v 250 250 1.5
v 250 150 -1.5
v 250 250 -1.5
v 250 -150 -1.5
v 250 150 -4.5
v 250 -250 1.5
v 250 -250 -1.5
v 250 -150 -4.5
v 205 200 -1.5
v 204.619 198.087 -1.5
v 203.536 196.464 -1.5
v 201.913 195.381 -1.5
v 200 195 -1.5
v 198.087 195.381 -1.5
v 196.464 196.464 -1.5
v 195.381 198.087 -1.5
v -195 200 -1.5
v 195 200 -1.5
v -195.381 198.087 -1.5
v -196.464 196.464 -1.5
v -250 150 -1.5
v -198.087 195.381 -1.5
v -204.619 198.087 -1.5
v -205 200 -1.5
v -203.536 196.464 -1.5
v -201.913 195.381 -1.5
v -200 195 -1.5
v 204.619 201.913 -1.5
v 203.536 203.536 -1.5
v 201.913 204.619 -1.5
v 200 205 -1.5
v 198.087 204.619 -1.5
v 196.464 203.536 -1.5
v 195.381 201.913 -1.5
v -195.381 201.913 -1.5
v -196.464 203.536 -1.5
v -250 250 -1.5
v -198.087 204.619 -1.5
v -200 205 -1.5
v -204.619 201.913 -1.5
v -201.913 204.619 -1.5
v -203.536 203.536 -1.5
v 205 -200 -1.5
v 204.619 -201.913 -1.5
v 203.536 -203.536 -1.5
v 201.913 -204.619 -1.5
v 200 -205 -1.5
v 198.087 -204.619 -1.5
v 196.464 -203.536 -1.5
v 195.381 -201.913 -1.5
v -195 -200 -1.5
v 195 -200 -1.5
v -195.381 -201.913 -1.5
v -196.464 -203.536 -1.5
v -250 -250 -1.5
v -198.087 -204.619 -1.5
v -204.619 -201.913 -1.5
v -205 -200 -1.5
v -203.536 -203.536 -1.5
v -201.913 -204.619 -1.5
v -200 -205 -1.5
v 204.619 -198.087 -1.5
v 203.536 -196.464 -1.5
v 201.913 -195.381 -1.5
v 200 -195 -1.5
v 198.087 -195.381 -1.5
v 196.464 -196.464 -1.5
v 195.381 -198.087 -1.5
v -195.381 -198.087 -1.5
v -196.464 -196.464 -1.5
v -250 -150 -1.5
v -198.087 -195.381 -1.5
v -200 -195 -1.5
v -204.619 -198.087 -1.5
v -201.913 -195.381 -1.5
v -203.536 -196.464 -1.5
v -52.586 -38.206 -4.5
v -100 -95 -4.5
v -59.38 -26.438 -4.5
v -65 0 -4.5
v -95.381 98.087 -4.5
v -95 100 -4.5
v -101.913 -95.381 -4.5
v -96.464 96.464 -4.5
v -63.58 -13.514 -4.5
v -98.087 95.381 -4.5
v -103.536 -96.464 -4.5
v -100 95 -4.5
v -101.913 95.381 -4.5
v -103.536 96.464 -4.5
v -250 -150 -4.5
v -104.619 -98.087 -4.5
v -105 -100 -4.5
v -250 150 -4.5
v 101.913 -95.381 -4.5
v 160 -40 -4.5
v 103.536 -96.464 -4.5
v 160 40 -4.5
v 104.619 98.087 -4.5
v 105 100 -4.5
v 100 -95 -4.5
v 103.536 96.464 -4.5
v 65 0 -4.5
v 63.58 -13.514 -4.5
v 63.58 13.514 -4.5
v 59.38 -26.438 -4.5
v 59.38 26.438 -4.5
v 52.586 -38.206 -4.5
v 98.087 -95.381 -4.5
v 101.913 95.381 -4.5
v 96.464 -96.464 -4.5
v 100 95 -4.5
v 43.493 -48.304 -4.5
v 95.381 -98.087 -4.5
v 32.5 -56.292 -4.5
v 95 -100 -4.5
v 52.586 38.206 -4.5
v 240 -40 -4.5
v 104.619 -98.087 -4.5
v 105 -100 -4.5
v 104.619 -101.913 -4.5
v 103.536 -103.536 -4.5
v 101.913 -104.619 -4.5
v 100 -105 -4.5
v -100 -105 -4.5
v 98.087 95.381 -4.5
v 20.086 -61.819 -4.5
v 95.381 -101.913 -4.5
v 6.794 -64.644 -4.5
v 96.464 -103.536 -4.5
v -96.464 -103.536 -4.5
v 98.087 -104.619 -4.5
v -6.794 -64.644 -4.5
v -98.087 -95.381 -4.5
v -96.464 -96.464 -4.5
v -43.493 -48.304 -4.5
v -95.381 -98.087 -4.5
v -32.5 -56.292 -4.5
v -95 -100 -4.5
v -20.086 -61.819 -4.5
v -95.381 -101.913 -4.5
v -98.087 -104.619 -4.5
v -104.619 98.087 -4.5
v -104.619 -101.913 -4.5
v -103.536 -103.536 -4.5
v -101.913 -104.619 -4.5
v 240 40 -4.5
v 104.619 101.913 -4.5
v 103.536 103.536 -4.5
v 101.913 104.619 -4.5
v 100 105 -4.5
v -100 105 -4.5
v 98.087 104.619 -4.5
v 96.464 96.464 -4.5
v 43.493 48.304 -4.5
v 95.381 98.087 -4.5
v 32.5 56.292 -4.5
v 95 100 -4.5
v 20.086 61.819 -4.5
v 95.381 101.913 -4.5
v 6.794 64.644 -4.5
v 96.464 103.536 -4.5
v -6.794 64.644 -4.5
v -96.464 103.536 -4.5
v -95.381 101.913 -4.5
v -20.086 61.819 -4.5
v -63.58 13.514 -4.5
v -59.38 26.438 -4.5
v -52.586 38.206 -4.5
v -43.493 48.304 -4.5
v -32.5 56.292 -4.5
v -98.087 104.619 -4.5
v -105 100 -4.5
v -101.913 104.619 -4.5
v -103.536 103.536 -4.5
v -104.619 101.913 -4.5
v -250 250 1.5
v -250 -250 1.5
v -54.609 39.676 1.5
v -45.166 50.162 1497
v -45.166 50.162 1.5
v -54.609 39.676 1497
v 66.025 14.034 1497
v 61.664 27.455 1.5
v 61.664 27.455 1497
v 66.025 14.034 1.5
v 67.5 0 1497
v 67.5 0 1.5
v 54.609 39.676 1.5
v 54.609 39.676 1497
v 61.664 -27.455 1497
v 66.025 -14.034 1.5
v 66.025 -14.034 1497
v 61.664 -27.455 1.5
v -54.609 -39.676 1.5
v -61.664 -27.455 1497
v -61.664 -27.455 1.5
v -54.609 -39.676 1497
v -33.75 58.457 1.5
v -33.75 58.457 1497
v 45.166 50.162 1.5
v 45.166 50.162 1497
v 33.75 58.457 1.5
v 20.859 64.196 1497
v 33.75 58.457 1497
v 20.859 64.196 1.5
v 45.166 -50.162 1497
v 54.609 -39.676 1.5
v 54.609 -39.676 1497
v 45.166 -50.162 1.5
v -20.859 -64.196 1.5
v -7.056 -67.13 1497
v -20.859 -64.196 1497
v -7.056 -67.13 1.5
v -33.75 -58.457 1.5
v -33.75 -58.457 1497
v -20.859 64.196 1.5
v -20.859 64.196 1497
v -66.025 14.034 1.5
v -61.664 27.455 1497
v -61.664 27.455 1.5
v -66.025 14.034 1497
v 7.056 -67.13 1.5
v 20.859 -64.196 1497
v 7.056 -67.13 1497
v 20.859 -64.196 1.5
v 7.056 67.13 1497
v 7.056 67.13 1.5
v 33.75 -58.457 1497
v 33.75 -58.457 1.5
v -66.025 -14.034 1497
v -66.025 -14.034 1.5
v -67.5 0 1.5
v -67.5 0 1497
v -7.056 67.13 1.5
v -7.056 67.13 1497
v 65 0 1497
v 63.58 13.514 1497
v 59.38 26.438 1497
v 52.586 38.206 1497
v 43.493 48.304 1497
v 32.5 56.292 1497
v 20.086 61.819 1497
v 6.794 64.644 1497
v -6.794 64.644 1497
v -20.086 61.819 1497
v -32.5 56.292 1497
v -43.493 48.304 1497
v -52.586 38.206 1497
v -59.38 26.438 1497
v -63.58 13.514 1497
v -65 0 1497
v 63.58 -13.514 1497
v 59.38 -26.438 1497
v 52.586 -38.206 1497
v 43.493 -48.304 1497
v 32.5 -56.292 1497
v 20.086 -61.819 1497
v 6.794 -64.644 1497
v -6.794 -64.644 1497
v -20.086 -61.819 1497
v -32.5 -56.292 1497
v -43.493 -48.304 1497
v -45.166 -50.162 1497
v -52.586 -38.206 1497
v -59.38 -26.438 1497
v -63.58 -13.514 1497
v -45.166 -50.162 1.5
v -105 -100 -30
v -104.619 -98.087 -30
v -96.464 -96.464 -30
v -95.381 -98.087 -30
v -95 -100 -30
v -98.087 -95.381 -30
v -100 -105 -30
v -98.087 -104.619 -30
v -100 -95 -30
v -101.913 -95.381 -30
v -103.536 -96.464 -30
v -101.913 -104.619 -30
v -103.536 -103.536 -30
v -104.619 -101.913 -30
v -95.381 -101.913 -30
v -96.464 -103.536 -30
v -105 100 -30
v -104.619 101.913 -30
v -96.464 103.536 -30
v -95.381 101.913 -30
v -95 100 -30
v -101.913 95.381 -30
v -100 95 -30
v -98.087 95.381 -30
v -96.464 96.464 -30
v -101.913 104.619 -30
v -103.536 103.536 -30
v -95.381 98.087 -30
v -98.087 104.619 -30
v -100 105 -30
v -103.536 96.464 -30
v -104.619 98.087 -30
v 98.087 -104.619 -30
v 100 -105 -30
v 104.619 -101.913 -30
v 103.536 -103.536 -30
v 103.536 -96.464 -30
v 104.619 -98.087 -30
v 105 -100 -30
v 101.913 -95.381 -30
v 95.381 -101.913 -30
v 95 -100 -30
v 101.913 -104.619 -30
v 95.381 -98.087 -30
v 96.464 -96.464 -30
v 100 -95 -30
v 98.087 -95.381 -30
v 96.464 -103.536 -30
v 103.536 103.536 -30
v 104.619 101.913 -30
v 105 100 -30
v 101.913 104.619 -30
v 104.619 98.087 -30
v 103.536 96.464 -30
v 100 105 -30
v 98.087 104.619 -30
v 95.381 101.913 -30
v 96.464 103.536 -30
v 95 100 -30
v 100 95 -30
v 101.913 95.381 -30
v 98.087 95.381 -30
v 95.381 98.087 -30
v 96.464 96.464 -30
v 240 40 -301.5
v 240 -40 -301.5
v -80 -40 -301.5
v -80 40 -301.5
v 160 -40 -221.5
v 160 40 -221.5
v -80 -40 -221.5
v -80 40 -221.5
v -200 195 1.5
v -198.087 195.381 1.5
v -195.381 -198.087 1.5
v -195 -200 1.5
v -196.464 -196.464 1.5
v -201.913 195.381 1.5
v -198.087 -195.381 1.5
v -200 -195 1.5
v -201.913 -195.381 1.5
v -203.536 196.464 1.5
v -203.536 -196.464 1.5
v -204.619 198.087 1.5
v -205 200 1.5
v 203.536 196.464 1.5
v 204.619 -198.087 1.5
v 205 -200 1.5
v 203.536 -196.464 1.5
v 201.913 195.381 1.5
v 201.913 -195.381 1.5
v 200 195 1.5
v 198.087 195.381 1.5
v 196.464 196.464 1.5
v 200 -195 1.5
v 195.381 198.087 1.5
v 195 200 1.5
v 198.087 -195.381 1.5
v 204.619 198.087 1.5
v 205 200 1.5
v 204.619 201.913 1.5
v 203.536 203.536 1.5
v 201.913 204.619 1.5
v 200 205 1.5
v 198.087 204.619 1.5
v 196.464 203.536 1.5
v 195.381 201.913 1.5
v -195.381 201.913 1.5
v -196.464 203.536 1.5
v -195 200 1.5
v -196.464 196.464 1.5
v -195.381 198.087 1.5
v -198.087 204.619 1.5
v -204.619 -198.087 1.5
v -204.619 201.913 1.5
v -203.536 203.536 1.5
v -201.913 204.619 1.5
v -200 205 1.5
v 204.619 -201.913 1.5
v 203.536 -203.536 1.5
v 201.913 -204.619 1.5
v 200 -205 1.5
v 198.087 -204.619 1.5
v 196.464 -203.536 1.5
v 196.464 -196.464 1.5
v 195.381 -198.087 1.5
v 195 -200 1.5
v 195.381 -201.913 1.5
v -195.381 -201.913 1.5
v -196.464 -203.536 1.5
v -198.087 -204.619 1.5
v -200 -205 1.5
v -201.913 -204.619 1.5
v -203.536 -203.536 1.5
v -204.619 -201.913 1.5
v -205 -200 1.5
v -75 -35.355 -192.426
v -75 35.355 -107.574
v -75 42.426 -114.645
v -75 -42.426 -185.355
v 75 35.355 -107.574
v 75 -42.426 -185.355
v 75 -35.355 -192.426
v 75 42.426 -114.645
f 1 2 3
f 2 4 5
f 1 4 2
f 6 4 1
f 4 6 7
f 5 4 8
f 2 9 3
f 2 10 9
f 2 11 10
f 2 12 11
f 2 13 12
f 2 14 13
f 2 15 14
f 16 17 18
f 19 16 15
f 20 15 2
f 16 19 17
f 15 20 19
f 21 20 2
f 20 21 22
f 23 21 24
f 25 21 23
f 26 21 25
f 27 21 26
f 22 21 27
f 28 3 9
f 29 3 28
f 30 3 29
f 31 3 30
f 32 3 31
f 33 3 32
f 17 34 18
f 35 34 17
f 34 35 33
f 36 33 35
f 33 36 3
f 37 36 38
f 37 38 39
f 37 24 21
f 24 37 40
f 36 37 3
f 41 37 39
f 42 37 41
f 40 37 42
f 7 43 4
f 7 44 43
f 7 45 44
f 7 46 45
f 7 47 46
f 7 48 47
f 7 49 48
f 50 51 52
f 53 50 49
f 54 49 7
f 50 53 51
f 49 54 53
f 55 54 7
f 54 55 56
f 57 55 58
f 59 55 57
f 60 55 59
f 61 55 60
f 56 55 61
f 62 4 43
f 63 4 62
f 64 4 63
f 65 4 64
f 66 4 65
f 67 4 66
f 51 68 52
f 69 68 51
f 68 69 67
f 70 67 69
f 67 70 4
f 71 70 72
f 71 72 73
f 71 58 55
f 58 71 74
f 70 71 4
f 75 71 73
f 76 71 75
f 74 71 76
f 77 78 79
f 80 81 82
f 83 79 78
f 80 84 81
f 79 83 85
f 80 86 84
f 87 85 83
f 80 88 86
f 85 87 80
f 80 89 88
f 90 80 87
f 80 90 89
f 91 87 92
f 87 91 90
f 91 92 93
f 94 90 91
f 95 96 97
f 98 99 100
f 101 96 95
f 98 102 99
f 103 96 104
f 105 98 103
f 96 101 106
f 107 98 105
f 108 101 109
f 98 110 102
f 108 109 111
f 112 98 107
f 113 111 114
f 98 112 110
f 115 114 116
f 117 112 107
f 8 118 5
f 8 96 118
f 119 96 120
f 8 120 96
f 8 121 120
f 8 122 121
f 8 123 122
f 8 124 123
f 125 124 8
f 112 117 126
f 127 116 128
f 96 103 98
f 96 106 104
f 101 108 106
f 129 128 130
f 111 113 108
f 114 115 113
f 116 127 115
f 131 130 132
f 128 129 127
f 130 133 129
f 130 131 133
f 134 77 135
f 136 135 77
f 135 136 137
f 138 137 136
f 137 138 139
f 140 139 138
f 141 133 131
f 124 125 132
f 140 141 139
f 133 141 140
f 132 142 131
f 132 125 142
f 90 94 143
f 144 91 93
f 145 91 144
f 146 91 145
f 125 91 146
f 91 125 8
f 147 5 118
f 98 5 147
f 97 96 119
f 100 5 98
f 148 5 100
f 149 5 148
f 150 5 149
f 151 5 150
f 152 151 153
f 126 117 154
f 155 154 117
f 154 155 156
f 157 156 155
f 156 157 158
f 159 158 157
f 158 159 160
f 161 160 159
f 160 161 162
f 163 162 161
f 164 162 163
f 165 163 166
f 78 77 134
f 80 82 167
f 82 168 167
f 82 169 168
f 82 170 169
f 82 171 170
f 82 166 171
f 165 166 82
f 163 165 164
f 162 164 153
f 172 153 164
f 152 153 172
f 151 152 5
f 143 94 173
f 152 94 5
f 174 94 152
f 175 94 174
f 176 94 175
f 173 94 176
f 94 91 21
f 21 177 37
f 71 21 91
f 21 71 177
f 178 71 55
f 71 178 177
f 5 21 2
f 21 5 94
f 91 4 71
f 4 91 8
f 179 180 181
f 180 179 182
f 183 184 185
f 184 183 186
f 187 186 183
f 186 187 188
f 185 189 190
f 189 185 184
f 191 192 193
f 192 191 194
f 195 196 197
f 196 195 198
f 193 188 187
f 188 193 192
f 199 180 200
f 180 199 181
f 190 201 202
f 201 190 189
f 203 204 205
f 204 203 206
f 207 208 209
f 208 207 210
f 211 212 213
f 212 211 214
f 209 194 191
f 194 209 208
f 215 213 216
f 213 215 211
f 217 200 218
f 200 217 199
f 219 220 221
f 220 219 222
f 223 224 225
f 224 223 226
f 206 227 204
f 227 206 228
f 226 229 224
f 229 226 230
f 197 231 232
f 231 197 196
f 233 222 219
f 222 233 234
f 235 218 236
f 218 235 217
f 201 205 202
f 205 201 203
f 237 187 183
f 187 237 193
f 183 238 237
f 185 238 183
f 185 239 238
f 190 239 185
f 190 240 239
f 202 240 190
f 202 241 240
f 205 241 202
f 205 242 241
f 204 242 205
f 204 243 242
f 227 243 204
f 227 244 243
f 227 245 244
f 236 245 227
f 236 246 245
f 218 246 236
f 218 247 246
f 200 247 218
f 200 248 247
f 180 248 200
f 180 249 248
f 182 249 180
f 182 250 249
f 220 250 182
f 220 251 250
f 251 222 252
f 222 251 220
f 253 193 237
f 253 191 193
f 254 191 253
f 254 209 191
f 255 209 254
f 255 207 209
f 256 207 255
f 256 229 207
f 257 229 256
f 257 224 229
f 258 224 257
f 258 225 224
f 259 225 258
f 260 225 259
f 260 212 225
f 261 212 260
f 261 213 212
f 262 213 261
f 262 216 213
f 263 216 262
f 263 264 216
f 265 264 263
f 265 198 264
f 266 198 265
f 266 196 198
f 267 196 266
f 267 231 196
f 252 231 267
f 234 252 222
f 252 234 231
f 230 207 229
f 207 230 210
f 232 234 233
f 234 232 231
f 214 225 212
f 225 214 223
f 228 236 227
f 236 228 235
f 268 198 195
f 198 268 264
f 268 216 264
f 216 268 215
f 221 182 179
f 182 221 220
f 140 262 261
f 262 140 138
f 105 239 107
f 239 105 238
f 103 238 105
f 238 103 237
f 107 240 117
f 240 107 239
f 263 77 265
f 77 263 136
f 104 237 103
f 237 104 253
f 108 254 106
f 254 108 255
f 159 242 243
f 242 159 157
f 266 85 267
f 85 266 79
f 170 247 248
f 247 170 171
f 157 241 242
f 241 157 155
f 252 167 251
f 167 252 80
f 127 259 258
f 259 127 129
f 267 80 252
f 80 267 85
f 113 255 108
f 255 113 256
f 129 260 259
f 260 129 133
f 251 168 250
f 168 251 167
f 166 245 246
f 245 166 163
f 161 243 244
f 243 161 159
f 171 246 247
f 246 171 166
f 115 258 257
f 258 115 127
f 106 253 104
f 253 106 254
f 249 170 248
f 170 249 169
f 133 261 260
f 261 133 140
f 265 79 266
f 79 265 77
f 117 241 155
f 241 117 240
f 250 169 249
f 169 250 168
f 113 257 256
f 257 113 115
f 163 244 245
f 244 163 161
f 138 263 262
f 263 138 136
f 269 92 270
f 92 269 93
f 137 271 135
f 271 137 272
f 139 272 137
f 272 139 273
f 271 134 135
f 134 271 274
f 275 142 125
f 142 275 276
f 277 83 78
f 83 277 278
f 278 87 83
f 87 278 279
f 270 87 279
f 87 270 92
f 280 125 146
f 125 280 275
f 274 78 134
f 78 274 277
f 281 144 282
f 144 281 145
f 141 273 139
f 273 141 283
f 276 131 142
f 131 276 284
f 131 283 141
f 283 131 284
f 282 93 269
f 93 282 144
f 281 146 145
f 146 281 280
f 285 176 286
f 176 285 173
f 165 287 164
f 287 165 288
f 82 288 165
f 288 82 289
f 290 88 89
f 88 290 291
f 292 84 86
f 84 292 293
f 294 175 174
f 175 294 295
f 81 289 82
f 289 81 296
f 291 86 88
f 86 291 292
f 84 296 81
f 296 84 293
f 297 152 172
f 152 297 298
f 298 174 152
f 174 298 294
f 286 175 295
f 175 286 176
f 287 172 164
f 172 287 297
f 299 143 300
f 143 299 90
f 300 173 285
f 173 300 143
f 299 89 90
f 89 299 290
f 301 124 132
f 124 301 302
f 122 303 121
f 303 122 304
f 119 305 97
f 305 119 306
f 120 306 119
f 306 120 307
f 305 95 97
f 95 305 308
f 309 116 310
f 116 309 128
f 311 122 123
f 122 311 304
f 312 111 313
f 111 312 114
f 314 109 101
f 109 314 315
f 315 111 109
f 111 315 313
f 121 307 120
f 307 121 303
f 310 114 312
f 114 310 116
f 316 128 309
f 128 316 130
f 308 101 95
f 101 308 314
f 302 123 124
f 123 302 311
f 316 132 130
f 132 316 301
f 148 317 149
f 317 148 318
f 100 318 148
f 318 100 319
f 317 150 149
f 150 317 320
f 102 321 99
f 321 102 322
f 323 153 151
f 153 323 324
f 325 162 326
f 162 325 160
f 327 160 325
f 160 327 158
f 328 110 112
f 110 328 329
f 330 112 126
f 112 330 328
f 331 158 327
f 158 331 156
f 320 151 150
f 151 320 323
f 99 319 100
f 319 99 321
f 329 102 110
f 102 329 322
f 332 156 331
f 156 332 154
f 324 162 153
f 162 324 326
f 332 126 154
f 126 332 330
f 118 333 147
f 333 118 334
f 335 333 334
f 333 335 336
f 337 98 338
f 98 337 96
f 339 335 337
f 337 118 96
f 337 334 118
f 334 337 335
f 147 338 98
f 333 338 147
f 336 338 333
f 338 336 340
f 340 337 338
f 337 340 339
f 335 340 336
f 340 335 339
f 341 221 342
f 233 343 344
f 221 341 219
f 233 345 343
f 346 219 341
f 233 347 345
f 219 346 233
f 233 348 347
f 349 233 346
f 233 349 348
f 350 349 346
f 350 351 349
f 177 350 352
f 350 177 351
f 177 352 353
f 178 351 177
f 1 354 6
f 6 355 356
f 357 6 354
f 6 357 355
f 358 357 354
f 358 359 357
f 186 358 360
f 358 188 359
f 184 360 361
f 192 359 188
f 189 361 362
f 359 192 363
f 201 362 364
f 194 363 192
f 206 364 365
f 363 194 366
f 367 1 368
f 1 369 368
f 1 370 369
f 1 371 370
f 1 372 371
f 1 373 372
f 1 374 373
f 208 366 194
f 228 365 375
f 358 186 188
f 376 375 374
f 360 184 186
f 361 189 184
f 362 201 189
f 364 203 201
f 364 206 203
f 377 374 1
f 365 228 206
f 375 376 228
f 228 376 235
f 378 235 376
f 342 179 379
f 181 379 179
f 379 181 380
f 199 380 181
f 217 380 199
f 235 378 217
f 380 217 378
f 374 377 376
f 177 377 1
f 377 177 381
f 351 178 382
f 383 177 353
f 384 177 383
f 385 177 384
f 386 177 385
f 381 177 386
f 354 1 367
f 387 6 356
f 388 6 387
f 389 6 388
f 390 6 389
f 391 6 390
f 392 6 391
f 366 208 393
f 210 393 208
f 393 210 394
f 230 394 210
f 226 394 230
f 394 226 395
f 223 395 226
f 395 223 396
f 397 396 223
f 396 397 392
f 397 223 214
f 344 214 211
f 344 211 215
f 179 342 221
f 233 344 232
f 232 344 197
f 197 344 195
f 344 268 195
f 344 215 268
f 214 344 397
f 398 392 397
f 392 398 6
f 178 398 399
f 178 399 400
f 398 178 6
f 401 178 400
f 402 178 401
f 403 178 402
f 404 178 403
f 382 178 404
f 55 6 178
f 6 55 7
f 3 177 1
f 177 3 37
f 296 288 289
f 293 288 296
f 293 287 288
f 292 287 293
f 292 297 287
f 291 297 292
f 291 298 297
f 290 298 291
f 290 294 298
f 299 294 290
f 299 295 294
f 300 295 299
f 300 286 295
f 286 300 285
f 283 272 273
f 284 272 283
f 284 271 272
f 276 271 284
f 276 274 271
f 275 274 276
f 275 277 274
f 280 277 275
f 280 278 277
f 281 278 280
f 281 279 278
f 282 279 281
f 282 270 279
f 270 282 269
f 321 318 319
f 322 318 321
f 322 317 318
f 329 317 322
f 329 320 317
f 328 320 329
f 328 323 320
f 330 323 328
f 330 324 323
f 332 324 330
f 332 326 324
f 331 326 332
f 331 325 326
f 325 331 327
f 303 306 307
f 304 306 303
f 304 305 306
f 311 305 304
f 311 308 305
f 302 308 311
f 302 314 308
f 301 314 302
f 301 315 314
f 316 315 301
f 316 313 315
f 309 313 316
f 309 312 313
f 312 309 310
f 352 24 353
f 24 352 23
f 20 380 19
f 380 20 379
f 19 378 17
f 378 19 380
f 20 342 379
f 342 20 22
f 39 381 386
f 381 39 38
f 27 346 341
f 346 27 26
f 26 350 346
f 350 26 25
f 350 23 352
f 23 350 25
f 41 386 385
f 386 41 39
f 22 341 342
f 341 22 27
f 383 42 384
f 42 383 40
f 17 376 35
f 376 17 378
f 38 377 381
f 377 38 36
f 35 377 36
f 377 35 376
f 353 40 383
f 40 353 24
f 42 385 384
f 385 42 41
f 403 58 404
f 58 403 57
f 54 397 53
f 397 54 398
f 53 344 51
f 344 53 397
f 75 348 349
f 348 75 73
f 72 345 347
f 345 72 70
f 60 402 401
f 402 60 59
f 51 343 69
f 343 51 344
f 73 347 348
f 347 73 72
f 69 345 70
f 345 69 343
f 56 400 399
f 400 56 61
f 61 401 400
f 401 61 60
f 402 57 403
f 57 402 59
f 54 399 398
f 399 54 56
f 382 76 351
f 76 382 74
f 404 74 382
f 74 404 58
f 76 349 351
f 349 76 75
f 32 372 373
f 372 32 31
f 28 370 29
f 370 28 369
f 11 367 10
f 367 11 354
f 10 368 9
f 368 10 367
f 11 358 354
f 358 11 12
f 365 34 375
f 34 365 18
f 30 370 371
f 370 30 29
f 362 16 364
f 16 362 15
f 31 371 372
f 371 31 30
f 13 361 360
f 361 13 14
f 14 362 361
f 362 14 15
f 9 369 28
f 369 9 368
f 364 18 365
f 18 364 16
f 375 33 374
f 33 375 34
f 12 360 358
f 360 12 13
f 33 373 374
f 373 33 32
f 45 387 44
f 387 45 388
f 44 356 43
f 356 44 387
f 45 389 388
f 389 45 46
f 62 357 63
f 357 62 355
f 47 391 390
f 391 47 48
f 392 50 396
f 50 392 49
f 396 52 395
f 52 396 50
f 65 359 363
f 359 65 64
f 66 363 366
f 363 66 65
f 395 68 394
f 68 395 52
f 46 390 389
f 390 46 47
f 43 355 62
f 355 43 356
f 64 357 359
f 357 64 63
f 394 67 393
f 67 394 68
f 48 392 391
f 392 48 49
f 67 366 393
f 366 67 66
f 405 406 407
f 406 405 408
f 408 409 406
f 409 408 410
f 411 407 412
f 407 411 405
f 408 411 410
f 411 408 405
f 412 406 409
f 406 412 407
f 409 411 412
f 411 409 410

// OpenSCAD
D=130;
leng=1500;
pipe_wall = 5;
mount_h2=100;

translate([0,0,-3]) difference(){
    union(){
        cube([500,300,3], center=true);
        cylinder(d=D+pipe_wall,h=leng);
        
    }
    translate([0,0,-2.5]) cylinder(d=D,h=leng+5);
    
    translate([-mount_h2,-mount_h2,-2.5]) cylinder(d=10,h=30);
    translate([-mount_h2,mount_h2,-2.5]) cylinder(d=10,h=30);
    translate([mount_h2,-mount_h2,-2.5]) cylinder(d=10,h=30);
    translate([mount_h2,mount_h2,-2.5]) cylinder(d=10,h=30);
}

translate([0,0,-1.5]) rotate([180,0,0]){
    translate([200,0,300/2]) cube([80,80,300],center=true);
    translate([150-80,0,300-80/2]) cube([300,80,80],center=true);
}


topmx =150;
topmy =110;
topmz =10;

//mirror
translate([0,0,-150]) rotate([45,0,0]) cube([topmx,topmy,topmz],center=true);

// below here is the fixed plate, above is the tube+plate+mirror mount
D=130;
leng=1500;
pipe_wall = 5;
mount_h=200;
mount_h2=100;
platexy = 500;
rotate([180,0,0]) difference(){
    union(){
        cube([platexy,platexy,3], center=true);
        //cylinder(d=D+pipe_wall,h=leng);
        //translate([0,0,-2.5]) cylinder(d=D,h=leng+5);
        translate([-mount_h2,-mount_h2,0]) cylinder(d=10,h=30);
        translate([-mount_h2,mount_h2,0]) cylinder(d=10,h=30);
        translate([mount_h2,-mount_h2,0]) cylinder(d=10,h=30);
        translate([mount_h2,mount_h2,0]) cylinder(d=10,h=30);
    }
    translate([0,0,-2.5]) cylinder(d=D,h=leng+5);
    translate([-mount_h,-mount_h,-2.5]) cylinder(d=10,h=leng+5);
    translate([-mount_h,mount_h,-2.5]) cylinder(d=10,h=leng+5);
    translate([mount_h,-mount_h,-2.5]) cylinder(d=10,h=leng+5);
    translate([mount_h,mount_h,-2.5]) cylinder(d=10,h=leng+5);
}

//translate() cube([40,40,300]);
